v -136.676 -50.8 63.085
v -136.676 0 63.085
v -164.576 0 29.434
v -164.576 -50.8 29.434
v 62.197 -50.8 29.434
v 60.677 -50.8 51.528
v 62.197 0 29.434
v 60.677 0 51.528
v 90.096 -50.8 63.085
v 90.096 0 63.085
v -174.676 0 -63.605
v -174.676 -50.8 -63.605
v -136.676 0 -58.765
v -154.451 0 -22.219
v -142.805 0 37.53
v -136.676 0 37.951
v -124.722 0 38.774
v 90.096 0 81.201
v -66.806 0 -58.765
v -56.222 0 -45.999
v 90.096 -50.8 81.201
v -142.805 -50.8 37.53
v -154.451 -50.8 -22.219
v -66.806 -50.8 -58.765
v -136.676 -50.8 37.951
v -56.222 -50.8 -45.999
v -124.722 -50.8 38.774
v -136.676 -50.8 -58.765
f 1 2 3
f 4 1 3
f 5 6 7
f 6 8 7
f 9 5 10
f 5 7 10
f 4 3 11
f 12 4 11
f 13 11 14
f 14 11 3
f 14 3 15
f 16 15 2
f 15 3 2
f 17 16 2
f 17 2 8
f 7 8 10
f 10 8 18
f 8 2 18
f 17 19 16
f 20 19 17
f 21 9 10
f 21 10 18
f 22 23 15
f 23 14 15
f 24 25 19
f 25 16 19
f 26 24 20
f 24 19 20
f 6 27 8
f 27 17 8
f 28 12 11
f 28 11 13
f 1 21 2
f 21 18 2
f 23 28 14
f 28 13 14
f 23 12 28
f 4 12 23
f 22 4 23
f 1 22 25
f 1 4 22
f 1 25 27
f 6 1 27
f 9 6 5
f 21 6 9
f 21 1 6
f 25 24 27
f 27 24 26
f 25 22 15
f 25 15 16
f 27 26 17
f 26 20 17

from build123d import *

# Parameters (mm, degrees)
F1_DEPTH = 25.4
F2_DEPTH = 25.4


with BuildPart() as f1:
    # F0 (on Front) → F1 (new body)
    with BuildSketch(Plane.XZ):
        Polygon((-174.676194787, -63.6054873466), (-136.6764605045, -58.7648972869), (-154.4505208731, -22.218702361), (-142.8054571152, 37.529643625), (-136.6764605045, 37.9512919024), (-124.7218182419, 38.7737192321), (60.676984489, 51.5283495188), (90.0961384177, 81.2006369233), (-136.6764605045, 63.0854219198), (-164.5756051188, 29.4337924282), align=None)
        Polygon((-124.7218182419, 38.7737192321), (-136.6764605045, 37.9512919024), (-66.8059885502, -58.7648972869), (-56.2220695239, -45.9986950765), align=None)
        Polygon((90.0961384177, 63.0854219198), (90.0961384177, 81.2006369233), (60.676984489, 51.5283495188), (62.1969938034, 29.4337924282), align=None)
    extrude(amount=F1_DEPTH)

    # F2 (add): a face of the model
    f2_faces = [f1.faces().sort_by_distance(p)[0] for p in [
        (-166.6256944507, -25.4, -17.4115576837),
    ]]
    extrude(f2_faces, amount=F2_DEPTH)


solid = f1.part
